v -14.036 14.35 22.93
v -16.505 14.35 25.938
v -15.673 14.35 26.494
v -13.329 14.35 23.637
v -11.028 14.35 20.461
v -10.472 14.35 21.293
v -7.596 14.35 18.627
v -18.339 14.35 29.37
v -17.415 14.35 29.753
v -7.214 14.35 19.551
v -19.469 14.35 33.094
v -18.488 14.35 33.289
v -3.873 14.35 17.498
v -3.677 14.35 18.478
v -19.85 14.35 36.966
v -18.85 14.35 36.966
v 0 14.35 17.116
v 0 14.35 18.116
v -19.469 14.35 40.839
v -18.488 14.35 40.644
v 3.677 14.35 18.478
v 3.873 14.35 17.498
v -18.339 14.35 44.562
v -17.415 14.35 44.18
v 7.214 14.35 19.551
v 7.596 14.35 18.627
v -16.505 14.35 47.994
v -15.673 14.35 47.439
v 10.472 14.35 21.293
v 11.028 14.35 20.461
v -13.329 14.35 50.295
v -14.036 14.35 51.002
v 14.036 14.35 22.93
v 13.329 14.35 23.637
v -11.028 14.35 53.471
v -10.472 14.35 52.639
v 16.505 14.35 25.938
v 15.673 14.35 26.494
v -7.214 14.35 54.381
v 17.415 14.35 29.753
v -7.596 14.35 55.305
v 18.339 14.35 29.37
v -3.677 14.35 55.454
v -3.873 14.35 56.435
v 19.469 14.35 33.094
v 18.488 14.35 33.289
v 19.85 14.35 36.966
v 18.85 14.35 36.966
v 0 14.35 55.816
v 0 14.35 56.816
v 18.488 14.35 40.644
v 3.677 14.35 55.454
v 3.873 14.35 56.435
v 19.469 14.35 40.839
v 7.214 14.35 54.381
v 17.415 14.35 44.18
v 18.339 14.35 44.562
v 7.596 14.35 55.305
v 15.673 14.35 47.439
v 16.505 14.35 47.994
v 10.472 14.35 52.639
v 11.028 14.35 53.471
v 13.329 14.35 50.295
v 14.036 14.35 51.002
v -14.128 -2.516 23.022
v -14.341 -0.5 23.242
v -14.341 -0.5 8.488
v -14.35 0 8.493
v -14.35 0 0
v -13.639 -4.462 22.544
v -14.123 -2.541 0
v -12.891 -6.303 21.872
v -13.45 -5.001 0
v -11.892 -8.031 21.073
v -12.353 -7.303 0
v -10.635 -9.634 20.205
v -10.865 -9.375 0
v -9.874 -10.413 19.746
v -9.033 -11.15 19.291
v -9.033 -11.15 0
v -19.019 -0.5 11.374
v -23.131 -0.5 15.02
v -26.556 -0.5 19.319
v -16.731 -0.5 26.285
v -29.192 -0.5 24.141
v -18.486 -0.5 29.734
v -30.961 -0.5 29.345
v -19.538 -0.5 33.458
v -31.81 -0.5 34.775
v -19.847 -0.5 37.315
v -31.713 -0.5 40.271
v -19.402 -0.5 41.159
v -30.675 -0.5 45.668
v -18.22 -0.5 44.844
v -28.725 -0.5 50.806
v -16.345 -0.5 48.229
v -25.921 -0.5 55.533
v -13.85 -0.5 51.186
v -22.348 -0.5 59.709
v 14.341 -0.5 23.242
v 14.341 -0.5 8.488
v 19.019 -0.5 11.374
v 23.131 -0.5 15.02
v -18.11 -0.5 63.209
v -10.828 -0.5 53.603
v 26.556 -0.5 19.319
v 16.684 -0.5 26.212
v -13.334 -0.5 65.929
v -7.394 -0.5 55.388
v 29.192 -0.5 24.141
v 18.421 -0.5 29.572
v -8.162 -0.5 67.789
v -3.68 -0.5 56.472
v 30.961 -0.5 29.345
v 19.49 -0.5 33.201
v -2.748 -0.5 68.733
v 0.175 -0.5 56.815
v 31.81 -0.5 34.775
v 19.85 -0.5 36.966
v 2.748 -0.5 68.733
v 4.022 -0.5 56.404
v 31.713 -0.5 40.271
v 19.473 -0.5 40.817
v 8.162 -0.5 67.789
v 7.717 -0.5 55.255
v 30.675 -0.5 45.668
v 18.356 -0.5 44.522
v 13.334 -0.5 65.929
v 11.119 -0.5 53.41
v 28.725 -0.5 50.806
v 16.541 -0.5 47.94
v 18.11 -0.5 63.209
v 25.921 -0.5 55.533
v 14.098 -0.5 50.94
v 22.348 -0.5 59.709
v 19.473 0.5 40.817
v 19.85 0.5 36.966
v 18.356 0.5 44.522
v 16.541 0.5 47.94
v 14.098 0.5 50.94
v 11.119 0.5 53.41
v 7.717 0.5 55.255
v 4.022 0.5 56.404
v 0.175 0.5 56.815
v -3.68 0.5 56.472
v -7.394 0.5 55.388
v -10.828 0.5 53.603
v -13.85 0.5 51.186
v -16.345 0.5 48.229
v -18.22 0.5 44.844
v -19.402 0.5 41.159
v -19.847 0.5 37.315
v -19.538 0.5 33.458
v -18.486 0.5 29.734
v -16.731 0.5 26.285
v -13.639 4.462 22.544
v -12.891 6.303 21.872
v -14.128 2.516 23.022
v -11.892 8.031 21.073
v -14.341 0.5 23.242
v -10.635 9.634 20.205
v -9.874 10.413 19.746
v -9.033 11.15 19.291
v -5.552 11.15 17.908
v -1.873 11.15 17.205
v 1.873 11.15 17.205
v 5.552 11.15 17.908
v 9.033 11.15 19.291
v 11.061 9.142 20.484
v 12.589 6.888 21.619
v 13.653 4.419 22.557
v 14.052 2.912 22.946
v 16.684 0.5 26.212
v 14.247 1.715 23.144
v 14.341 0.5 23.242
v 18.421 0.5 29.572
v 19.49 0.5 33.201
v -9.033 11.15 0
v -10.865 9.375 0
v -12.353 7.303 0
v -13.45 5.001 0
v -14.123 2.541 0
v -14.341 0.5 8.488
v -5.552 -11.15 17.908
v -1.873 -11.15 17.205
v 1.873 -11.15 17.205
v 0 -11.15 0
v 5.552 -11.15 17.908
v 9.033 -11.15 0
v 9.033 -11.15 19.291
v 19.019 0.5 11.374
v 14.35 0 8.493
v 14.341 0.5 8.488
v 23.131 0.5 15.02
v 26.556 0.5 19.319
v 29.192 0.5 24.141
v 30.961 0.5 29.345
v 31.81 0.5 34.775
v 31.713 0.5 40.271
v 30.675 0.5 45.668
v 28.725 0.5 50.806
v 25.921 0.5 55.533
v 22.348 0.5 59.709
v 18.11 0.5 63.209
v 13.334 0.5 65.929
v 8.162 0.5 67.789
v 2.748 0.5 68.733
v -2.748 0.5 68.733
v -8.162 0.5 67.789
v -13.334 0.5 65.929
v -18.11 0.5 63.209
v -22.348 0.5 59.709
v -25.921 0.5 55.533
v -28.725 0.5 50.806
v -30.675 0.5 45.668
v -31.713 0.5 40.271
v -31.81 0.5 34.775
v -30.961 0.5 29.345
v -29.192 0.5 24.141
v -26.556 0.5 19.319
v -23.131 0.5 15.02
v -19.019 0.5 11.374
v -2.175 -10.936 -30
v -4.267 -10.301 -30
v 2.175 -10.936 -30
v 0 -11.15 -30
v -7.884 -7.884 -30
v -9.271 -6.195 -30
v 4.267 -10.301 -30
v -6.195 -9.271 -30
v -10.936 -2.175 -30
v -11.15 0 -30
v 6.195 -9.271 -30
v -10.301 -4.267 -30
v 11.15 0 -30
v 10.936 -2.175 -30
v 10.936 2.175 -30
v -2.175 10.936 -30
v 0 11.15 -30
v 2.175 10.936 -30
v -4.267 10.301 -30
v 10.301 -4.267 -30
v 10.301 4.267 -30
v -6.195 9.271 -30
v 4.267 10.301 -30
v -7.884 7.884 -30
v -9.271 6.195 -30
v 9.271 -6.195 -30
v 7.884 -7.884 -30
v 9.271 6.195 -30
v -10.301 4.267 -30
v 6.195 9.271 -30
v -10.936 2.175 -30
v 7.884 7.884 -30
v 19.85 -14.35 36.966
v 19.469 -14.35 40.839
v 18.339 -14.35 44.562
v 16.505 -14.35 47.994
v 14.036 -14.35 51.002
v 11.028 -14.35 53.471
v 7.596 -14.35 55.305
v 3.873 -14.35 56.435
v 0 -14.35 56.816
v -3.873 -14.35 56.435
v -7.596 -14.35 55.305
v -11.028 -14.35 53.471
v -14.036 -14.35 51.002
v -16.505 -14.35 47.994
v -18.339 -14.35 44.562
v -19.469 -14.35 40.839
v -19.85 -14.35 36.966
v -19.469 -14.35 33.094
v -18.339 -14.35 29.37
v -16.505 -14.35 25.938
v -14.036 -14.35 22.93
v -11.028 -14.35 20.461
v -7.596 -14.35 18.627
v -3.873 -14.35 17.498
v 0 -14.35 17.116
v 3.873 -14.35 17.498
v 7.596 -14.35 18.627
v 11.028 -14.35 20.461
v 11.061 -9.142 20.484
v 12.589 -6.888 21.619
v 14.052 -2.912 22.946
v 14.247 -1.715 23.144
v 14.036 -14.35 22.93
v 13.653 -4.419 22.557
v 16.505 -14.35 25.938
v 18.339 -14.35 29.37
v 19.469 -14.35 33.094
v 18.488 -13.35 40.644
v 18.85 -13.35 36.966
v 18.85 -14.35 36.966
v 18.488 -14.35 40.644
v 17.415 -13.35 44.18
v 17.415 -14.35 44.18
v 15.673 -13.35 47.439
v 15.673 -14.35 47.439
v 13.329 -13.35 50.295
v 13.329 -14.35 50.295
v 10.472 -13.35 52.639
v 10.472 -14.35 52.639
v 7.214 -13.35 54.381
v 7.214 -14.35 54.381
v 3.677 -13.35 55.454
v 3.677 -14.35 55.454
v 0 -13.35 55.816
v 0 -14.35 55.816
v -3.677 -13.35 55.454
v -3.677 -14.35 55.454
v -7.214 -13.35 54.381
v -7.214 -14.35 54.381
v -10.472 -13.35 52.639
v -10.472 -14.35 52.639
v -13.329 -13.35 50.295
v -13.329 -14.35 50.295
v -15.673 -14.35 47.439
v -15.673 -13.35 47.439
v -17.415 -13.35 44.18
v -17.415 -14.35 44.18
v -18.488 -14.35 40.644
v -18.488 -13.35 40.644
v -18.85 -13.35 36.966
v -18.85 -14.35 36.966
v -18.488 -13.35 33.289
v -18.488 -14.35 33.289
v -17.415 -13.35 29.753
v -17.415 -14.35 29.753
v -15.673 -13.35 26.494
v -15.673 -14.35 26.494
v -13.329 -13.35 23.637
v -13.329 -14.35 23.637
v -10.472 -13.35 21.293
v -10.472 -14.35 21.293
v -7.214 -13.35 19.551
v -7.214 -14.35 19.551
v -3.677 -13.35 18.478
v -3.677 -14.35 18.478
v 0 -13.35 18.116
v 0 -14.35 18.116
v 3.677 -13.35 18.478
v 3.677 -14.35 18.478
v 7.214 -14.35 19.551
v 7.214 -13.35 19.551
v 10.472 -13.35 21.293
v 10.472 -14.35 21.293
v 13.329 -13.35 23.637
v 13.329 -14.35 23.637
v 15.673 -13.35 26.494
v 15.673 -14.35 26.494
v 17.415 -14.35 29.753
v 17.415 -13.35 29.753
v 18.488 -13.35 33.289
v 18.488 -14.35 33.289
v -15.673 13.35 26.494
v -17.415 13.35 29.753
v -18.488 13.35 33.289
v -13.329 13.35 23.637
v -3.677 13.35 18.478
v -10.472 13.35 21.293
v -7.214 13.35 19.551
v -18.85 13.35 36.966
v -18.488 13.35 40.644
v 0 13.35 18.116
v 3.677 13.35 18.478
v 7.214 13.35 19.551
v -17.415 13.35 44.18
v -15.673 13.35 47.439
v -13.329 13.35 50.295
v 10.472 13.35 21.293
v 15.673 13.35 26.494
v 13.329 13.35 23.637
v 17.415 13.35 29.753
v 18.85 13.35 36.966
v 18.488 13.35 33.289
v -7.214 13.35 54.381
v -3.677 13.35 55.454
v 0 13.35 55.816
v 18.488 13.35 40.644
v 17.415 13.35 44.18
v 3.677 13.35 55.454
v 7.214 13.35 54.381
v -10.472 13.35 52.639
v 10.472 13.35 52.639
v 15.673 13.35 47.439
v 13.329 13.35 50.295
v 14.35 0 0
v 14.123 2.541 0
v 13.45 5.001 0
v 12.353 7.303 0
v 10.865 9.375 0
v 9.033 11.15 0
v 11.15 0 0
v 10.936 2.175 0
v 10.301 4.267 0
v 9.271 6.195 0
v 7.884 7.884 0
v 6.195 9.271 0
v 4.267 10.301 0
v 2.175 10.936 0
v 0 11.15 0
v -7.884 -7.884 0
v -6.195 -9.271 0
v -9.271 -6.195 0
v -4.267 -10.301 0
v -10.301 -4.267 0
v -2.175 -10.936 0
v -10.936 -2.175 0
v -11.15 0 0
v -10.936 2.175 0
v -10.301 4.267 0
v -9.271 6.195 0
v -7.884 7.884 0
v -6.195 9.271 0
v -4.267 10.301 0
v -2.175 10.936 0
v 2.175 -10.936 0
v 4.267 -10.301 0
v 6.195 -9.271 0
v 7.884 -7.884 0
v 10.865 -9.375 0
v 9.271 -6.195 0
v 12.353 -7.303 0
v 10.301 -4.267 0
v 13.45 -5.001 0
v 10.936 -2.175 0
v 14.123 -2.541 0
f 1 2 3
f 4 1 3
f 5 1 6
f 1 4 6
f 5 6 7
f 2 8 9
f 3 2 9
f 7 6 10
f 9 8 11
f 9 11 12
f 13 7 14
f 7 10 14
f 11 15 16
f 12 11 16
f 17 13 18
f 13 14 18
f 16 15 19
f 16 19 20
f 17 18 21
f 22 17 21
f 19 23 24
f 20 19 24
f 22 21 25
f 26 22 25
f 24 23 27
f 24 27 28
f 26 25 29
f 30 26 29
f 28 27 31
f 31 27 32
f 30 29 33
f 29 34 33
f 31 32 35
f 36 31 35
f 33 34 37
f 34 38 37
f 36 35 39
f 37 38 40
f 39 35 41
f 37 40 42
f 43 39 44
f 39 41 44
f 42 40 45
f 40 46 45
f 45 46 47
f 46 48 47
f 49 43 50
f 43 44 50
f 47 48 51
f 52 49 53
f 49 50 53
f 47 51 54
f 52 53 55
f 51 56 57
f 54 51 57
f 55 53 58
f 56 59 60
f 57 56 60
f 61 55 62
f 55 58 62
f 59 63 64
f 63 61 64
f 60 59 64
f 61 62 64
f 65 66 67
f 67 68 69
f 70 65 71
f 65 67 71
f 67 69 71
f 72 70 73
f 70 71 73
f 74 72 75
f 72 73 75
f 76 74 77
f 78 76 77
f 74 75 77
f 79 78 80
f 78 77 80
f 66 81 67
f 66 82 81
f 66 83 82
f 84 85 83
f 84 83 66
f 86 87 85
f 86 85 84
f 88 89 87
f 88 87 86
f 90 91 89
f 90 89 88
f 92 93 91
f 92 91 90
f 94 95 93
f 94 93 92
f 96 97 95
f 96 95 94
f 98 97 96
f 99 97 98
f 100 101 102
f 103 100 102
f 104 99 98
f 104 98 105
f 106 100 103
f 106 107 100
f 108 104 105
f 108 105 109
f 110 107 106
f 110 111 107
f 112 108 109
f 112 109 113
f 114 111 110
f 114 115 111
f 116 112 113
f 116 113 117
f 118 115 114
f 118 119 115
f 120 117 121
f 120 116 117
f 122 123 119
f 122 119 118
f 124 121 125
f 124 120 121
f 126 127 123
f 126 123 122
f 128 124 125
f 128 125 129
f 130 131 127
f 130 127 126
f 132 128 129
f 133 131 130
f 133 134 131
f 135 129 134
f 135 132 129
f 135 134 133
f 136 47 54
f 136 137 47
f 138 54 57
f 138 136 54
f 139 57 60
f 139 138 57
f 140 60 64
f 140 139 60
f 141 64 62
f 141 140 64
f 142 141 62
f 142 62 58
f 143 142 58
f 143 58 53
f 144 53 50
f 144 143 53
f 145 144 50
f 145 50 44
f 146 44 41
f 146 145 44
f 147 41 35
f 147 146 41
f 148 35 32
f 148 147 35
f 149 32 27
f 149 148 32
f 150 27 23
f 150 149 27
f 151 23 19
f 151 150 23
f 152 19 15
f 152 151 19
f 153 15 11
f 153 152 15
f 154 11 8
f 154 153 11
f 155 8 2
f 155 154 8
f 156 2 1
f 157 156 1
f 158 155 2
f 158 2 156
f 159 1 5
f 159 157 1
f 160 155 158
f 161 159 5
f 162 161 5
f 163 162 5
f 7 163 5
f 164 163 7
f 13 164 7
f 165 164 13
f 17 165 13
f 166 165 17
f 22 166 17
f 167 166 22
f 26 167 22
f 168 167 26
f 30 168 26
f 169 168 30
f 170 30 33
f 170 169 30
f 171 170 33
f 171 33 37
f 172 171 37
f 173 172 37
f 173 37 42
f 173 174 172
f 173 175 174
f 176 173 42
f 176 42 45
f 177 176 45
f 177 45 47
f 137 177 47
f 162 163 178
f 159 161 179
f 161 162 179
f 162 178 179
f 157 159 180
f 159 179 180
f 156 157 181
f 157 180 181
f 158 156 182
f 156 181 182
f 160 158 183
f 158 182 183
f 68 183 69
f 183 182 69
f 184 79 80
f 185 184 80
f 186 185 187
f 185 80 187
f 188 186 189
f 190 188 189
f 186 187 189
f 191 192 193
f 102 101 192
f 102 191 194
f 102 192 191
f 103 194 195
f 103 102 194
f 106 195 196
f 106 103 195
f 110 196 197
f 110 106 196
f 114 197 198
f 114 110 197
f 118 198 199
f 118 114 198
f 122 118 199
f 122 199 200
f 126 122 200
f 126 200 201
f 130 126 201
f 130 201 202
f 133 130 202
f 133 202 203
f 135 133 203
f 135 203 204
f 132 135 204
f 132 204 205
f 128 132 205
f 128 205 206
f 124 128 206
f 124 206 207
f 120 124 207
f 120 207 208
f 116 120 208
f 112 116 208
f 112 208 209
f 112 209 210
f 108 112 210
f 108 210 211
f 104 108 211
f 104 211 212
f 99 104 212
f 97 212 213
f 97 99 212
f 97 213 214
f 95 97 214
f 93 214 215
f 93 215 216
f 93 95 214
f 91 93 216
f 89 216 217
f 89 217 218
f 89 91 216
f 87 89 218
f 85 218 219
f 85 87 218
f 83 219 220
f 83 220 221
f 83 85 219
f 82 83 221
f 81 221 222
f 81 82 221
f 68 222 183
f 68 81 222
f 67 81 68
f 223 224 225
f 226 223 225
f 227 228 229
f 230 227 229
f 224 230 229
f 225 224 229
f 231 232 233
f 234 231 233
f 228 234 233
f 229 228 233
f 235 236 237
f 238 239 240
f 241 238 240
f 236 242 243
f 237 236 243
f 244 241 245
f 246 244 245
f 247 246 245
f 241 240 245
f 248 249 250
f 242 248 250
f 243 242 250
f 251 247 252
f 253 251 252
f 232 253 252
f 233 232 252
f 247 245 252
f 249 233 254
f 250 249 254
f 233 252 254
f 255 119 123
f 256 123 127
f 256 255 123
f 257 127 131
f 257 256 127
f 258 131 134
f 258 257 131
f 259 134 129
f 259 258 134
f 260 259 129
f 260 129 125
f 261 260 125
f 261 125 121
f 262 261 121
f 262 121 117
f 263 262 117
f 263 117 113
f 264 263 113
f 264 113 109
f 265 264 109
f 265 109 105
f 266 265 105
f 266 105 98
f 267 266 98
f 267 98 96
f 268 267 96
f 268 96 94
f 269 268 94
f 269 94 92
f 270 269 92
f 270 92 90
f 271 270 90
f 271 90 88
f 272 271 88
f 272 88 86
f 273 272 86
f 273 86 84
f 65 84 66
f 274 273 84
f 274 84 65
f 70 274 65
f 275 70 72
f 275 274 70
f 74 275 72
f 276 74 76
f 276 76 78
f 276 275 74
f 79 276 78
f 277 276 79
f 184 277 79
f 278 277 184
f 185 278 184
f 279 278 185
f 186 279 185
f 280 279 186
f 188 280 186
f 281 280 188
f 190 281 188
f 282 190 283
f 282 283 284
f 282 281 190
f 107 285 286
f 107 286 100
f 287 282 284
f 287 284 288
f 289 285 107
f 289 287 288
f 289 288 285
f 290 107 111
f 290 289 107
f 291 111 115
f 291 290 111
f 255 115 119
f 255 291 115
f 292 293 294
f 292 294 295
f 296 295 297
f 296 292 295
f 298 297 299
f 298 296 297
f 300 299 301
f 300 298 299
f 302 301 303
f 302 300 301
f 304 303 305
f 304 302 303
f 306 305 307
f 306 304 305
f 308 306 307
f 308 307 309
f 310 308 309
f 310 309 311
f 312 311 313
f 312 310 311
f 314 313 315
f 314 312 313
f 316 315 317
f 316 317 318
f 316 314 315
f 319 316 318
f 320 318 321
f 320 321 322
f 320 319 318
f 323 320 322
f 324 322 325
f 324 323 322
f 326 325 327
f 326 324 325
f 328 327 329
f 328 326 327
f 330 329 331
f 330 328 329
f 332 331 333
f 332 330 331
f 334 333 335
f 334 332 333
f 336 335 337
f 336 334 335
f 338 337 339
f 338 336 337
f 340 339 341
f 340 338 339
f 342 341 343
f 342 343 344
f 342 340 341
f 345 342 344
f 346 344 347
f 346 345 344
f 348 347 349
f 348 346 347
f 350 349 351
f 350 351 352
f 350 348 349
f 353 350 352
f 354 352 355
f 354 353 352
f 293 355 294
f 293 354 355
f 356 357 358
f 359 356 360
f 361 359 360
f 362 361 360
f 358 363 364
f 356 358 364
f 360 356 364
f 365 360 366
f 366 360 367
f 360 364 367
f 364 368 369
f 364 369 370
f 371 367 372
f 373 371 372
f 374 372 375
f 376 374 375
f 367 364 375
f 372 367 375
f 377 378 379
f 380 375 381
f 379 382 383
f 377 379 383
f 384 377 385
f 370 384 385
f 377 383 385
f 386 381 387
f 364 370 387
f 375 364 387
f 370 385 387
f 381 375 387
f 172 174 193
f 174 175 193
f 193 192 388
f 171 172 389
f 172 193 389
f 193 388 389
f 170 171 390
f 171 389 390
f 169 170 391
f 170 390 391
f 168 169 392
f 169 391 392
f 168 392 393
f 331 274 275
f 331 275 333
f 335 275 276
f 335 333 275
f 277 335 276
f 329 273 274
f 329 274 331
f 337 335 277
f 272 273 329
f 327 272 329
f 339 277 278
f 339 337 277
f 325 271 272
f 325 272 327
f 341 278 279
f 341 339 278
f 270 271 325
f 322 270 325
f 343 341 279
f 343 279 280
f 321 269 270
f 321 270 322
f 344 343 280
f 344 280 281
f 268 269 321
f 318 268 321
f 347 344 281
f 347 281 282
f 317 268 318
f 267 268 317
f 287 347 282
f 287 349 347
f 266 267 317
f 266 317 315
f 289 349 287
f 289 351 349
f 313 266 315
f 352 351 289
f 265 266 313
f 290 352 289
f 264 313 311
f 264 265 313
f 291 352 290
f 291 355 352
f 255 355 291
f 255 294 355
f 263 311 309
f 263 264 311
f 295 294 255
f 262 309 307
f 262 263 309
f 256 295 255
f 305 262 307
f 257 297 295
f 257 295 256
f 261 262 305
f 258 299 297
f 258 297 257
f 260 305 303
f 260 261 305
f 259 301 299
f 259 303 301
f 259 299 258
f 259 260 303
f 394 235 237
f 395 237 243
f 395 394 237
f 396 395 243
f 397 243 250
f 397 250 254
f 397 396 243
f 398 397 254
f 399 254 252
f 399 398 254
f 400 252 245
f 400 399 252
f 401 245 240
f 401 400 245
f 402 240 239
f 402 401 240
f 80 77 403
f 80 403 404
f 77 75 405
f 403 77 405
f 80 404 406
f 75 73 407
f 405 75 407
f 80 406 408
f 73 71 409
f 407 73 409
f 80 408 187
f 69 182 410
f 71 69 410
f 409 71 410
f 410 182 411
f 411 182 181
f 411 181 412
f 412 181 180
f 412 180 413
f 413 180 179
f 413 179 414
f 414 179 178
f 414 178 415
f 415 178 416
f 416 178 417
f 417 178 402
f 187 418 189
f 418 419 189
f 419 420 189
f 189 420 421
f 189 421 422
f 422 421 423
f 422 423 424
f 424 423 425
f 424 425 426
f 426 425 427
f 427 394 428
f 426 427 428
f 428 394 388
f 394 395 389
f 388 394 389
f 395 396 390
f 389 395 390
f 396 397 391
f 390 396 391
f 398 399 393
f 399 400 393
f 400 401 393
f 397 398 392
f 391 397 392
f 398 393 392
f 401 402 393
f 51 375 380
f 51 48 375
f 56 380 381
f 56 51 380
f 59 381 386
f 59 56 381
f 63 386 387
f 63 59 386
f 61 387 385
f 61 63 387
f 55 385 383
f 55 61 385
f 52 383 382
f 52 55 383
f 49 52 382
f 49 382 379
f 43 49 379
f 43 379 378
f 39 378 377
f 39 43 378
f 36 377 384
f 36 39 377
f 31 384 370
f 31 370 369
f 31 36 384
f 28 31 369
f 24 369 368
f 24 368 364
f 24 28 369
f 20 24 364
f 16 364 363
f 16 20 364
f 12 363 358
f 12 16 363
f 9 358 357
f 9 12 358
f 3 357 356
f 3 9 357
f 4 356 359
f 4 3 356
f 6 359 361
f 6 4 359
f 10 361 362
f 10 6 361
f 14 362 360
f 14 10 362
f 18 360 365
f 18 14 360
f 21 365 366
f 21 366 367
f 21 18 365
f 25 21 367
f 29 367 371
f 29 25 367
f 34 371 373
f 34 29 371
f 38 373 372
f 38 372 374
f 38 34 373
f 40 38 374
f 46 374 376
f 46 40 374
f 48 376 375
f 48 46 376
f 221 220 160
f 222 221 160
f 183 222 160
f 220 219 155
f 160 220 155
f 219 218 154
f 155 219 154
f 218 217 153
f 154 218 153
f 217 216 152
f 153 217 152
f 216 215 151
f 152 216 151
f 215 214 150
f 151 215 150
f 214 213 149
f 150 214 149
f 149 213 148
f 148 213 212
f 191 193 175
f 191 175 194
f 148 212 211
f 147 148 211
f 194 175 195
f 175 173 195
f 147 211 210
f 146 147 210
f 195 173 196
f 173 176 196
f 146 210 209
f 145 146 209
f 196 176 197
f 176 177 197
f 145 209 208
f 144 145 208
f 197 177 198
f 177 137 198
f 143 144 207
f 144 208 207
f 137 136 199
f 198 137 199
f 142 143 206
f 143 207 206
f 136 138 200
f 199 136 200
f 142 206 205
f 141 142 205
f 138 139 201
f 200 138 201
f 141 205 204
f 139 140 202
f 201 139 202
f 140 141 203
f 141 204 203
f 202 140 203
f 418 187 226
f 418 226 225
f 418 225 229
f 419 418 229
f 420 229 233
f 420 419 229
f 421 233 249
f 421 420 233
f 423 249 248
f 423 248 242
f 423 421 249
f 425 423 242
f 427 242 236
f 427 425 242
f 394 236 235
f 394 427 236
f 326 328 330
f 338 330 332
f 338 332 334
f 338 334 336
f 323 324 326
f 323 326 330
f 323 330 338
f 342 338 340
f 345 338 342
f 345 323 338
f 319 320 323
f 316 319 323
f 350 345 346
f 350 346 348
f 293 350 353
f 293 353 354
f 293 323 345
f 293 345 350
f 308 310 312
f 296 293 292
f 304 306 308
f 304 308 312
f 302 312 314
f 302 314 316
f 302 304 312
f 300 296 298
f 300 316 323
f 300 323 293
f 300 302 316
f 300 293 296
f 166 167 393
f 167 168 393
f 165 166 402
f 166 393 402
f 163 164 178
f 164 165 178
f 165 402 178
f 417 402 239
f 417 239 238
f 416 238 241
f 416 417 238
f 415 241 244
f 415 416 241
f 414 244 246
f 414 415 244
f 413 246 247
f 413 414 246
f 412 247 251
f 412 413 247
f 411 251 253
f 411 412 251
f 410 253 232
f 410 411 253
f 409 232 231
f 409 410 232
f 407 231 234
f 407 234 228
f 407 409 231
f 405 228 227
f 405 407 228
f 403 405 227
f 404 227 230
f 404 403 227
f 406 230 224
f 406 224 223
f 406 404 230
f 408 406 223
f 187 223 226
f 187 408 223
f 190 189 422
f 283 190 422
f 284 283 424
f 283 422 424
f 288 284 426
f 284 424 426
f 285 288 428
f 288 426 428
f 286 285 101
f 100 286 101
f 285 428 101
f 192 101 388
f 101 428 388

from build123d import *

# Parameters (mm, degrees)
F1_R     = 18.85
F2_DEPTH = 13.35
F1_R_2   = 19.85
F3_DEPTH = 14.35
F4_DEPTH = 34.2
F5_DEPTH = 30
F6_DEPTH = 20.9
F1_R_3   = 31.8850678314
F8_DEPTH = 0.5


with BuildPart() as f2:
    # F1 (on Front) → F2 (new body, symmetric)
    with BuildSketch(Plane.XZ):
        with Locations((0, 36.9661189616)):
            Circle(F1_R)
    extrude(amount=F2_DEPTH, both=True)

    # F1 (on Front) → F3 (join, symmetric)
    with BuildSketch(Plane.XZ):
        with Locations((0, 36.9661189616)):
            Circle(F1_R_2)
        with Locations((0, 36.9661189616)):
            Circle(F1_R, mode=Mode.SUBTRACT)
    extrude(amount=F3_DEPTH, both=True)



with BuildPart() as f4:
    # F0 (on Top) → F4 (new body)
    with BuildSketch(Plane.XY):
        with BuildLine():
            ThreePointArc((5.4e-09, -11.15), (7.8842406121, -7.8842406083), (11.15, 0))
            ThreePointArc((11.15, 0), (7.8842406263, 7.8842405941), (4.56e-08, 11.15))
            ThreePointArc((4.56e-08, 11.15), (-11.15, 2.01e-08), (5.4e-09, -11.15))
        make_face()
        with BuildLine():
            ThreePointArc((4.56e-08, 11.15), (7.8842406263, 7.8842405941), (11.15, 0))
            ThreePointArc((11.15, 0), (7.8842406121, -7.8842406083), (5.4e-09, -11.15))
            Line((5.4e-09, -11.15), (9.0332718325, -11.15))
            ThreePointArc((9.0332718325, -11.15), (12.9527979757, -6.1763682372), (14.35, 0))
            ThreePointArc((14.35, 0), (12.9527979757, 6.1763682372), (9.0332718325, 11.15))
            Line((9.0332718325, 11.15), (4.56e-08, 11.15))
        make_face()
        with BuildLine():
            ThreePointArc((5.4e-09, -11.15), (-11.15, 2.01e-08), (4.56e-08, 11.15))
            Line((4.56e-08, 11.15), (-9.0332718325, 11.15))
            ThreePointArc((-9.0332718325, 11.15), (-12.9527979757, 6.1763682372), (-14.35, 0))
            ThreePointArc((-14.35, 0), (-12.9527979757, -6.1763682372), (-9.0332718325, -11.15))
            Line((-9.0332718325, -11.15), (5.4e-09, -11.15))
        make_face()
    extrude(amount=F4_DEPTH)

    # F0 (on Top) → F5 (join)
    with BuildSketch(Plane.XY):
        with BuildLine():
            ThreePointArc((5.4e-09, -11.15), (7.8842406121, -7.8842406083), (11.15, 0))
            ThreePointArc((11.15, 0), (7.8842406263, 7.8842405941), (4.56e-08, 11.15))
            ThreePointArc((4.56e-08, 11.15), (-11.15, 2.01e-08), (5.4e-09, -11.15))
        make_face()
    extrude(amount=-F5_DEPTH)


with BuildPart() as f6:
    # F1 (on Front) → F6 (new body, symmetric)
    with BuildSketch(Plane.XZ):
        with Locations((0, 36.9661189616)):
            Circle(F1_R_2)
        with Locations((0, 36.9661189616)):
            Circle(F1_R, mode=Mode.SUBTRACT)
        with Locations((0, 36.9661189616)):
            Circle(F1_R)
    extrude(amount=F6_DEPTH, both=True)


with BuildPart() as f4_1:
    add(f4.part)

    # F7: cut F6
    add(f6.part, mode=Mode.SUBTRACT)


with BuildPart() as f2_1:
    add(f2.part)

    add(f4_1.part)  # F8 merges F4
    # F1 (on Front) → F8 (join, symmetric)
    with BuildSketch(Plane.XZ):
        with Locations((0, 36.9661189616)):
            Circle(F1_R_3)
        with Locations((0, 36.9661189616)):
            Circle(F1_R_2, mode=Mode.SUBTRACT)
    extrude(amount=F8_DEPTH, both=True)


solid = f2_1.part
